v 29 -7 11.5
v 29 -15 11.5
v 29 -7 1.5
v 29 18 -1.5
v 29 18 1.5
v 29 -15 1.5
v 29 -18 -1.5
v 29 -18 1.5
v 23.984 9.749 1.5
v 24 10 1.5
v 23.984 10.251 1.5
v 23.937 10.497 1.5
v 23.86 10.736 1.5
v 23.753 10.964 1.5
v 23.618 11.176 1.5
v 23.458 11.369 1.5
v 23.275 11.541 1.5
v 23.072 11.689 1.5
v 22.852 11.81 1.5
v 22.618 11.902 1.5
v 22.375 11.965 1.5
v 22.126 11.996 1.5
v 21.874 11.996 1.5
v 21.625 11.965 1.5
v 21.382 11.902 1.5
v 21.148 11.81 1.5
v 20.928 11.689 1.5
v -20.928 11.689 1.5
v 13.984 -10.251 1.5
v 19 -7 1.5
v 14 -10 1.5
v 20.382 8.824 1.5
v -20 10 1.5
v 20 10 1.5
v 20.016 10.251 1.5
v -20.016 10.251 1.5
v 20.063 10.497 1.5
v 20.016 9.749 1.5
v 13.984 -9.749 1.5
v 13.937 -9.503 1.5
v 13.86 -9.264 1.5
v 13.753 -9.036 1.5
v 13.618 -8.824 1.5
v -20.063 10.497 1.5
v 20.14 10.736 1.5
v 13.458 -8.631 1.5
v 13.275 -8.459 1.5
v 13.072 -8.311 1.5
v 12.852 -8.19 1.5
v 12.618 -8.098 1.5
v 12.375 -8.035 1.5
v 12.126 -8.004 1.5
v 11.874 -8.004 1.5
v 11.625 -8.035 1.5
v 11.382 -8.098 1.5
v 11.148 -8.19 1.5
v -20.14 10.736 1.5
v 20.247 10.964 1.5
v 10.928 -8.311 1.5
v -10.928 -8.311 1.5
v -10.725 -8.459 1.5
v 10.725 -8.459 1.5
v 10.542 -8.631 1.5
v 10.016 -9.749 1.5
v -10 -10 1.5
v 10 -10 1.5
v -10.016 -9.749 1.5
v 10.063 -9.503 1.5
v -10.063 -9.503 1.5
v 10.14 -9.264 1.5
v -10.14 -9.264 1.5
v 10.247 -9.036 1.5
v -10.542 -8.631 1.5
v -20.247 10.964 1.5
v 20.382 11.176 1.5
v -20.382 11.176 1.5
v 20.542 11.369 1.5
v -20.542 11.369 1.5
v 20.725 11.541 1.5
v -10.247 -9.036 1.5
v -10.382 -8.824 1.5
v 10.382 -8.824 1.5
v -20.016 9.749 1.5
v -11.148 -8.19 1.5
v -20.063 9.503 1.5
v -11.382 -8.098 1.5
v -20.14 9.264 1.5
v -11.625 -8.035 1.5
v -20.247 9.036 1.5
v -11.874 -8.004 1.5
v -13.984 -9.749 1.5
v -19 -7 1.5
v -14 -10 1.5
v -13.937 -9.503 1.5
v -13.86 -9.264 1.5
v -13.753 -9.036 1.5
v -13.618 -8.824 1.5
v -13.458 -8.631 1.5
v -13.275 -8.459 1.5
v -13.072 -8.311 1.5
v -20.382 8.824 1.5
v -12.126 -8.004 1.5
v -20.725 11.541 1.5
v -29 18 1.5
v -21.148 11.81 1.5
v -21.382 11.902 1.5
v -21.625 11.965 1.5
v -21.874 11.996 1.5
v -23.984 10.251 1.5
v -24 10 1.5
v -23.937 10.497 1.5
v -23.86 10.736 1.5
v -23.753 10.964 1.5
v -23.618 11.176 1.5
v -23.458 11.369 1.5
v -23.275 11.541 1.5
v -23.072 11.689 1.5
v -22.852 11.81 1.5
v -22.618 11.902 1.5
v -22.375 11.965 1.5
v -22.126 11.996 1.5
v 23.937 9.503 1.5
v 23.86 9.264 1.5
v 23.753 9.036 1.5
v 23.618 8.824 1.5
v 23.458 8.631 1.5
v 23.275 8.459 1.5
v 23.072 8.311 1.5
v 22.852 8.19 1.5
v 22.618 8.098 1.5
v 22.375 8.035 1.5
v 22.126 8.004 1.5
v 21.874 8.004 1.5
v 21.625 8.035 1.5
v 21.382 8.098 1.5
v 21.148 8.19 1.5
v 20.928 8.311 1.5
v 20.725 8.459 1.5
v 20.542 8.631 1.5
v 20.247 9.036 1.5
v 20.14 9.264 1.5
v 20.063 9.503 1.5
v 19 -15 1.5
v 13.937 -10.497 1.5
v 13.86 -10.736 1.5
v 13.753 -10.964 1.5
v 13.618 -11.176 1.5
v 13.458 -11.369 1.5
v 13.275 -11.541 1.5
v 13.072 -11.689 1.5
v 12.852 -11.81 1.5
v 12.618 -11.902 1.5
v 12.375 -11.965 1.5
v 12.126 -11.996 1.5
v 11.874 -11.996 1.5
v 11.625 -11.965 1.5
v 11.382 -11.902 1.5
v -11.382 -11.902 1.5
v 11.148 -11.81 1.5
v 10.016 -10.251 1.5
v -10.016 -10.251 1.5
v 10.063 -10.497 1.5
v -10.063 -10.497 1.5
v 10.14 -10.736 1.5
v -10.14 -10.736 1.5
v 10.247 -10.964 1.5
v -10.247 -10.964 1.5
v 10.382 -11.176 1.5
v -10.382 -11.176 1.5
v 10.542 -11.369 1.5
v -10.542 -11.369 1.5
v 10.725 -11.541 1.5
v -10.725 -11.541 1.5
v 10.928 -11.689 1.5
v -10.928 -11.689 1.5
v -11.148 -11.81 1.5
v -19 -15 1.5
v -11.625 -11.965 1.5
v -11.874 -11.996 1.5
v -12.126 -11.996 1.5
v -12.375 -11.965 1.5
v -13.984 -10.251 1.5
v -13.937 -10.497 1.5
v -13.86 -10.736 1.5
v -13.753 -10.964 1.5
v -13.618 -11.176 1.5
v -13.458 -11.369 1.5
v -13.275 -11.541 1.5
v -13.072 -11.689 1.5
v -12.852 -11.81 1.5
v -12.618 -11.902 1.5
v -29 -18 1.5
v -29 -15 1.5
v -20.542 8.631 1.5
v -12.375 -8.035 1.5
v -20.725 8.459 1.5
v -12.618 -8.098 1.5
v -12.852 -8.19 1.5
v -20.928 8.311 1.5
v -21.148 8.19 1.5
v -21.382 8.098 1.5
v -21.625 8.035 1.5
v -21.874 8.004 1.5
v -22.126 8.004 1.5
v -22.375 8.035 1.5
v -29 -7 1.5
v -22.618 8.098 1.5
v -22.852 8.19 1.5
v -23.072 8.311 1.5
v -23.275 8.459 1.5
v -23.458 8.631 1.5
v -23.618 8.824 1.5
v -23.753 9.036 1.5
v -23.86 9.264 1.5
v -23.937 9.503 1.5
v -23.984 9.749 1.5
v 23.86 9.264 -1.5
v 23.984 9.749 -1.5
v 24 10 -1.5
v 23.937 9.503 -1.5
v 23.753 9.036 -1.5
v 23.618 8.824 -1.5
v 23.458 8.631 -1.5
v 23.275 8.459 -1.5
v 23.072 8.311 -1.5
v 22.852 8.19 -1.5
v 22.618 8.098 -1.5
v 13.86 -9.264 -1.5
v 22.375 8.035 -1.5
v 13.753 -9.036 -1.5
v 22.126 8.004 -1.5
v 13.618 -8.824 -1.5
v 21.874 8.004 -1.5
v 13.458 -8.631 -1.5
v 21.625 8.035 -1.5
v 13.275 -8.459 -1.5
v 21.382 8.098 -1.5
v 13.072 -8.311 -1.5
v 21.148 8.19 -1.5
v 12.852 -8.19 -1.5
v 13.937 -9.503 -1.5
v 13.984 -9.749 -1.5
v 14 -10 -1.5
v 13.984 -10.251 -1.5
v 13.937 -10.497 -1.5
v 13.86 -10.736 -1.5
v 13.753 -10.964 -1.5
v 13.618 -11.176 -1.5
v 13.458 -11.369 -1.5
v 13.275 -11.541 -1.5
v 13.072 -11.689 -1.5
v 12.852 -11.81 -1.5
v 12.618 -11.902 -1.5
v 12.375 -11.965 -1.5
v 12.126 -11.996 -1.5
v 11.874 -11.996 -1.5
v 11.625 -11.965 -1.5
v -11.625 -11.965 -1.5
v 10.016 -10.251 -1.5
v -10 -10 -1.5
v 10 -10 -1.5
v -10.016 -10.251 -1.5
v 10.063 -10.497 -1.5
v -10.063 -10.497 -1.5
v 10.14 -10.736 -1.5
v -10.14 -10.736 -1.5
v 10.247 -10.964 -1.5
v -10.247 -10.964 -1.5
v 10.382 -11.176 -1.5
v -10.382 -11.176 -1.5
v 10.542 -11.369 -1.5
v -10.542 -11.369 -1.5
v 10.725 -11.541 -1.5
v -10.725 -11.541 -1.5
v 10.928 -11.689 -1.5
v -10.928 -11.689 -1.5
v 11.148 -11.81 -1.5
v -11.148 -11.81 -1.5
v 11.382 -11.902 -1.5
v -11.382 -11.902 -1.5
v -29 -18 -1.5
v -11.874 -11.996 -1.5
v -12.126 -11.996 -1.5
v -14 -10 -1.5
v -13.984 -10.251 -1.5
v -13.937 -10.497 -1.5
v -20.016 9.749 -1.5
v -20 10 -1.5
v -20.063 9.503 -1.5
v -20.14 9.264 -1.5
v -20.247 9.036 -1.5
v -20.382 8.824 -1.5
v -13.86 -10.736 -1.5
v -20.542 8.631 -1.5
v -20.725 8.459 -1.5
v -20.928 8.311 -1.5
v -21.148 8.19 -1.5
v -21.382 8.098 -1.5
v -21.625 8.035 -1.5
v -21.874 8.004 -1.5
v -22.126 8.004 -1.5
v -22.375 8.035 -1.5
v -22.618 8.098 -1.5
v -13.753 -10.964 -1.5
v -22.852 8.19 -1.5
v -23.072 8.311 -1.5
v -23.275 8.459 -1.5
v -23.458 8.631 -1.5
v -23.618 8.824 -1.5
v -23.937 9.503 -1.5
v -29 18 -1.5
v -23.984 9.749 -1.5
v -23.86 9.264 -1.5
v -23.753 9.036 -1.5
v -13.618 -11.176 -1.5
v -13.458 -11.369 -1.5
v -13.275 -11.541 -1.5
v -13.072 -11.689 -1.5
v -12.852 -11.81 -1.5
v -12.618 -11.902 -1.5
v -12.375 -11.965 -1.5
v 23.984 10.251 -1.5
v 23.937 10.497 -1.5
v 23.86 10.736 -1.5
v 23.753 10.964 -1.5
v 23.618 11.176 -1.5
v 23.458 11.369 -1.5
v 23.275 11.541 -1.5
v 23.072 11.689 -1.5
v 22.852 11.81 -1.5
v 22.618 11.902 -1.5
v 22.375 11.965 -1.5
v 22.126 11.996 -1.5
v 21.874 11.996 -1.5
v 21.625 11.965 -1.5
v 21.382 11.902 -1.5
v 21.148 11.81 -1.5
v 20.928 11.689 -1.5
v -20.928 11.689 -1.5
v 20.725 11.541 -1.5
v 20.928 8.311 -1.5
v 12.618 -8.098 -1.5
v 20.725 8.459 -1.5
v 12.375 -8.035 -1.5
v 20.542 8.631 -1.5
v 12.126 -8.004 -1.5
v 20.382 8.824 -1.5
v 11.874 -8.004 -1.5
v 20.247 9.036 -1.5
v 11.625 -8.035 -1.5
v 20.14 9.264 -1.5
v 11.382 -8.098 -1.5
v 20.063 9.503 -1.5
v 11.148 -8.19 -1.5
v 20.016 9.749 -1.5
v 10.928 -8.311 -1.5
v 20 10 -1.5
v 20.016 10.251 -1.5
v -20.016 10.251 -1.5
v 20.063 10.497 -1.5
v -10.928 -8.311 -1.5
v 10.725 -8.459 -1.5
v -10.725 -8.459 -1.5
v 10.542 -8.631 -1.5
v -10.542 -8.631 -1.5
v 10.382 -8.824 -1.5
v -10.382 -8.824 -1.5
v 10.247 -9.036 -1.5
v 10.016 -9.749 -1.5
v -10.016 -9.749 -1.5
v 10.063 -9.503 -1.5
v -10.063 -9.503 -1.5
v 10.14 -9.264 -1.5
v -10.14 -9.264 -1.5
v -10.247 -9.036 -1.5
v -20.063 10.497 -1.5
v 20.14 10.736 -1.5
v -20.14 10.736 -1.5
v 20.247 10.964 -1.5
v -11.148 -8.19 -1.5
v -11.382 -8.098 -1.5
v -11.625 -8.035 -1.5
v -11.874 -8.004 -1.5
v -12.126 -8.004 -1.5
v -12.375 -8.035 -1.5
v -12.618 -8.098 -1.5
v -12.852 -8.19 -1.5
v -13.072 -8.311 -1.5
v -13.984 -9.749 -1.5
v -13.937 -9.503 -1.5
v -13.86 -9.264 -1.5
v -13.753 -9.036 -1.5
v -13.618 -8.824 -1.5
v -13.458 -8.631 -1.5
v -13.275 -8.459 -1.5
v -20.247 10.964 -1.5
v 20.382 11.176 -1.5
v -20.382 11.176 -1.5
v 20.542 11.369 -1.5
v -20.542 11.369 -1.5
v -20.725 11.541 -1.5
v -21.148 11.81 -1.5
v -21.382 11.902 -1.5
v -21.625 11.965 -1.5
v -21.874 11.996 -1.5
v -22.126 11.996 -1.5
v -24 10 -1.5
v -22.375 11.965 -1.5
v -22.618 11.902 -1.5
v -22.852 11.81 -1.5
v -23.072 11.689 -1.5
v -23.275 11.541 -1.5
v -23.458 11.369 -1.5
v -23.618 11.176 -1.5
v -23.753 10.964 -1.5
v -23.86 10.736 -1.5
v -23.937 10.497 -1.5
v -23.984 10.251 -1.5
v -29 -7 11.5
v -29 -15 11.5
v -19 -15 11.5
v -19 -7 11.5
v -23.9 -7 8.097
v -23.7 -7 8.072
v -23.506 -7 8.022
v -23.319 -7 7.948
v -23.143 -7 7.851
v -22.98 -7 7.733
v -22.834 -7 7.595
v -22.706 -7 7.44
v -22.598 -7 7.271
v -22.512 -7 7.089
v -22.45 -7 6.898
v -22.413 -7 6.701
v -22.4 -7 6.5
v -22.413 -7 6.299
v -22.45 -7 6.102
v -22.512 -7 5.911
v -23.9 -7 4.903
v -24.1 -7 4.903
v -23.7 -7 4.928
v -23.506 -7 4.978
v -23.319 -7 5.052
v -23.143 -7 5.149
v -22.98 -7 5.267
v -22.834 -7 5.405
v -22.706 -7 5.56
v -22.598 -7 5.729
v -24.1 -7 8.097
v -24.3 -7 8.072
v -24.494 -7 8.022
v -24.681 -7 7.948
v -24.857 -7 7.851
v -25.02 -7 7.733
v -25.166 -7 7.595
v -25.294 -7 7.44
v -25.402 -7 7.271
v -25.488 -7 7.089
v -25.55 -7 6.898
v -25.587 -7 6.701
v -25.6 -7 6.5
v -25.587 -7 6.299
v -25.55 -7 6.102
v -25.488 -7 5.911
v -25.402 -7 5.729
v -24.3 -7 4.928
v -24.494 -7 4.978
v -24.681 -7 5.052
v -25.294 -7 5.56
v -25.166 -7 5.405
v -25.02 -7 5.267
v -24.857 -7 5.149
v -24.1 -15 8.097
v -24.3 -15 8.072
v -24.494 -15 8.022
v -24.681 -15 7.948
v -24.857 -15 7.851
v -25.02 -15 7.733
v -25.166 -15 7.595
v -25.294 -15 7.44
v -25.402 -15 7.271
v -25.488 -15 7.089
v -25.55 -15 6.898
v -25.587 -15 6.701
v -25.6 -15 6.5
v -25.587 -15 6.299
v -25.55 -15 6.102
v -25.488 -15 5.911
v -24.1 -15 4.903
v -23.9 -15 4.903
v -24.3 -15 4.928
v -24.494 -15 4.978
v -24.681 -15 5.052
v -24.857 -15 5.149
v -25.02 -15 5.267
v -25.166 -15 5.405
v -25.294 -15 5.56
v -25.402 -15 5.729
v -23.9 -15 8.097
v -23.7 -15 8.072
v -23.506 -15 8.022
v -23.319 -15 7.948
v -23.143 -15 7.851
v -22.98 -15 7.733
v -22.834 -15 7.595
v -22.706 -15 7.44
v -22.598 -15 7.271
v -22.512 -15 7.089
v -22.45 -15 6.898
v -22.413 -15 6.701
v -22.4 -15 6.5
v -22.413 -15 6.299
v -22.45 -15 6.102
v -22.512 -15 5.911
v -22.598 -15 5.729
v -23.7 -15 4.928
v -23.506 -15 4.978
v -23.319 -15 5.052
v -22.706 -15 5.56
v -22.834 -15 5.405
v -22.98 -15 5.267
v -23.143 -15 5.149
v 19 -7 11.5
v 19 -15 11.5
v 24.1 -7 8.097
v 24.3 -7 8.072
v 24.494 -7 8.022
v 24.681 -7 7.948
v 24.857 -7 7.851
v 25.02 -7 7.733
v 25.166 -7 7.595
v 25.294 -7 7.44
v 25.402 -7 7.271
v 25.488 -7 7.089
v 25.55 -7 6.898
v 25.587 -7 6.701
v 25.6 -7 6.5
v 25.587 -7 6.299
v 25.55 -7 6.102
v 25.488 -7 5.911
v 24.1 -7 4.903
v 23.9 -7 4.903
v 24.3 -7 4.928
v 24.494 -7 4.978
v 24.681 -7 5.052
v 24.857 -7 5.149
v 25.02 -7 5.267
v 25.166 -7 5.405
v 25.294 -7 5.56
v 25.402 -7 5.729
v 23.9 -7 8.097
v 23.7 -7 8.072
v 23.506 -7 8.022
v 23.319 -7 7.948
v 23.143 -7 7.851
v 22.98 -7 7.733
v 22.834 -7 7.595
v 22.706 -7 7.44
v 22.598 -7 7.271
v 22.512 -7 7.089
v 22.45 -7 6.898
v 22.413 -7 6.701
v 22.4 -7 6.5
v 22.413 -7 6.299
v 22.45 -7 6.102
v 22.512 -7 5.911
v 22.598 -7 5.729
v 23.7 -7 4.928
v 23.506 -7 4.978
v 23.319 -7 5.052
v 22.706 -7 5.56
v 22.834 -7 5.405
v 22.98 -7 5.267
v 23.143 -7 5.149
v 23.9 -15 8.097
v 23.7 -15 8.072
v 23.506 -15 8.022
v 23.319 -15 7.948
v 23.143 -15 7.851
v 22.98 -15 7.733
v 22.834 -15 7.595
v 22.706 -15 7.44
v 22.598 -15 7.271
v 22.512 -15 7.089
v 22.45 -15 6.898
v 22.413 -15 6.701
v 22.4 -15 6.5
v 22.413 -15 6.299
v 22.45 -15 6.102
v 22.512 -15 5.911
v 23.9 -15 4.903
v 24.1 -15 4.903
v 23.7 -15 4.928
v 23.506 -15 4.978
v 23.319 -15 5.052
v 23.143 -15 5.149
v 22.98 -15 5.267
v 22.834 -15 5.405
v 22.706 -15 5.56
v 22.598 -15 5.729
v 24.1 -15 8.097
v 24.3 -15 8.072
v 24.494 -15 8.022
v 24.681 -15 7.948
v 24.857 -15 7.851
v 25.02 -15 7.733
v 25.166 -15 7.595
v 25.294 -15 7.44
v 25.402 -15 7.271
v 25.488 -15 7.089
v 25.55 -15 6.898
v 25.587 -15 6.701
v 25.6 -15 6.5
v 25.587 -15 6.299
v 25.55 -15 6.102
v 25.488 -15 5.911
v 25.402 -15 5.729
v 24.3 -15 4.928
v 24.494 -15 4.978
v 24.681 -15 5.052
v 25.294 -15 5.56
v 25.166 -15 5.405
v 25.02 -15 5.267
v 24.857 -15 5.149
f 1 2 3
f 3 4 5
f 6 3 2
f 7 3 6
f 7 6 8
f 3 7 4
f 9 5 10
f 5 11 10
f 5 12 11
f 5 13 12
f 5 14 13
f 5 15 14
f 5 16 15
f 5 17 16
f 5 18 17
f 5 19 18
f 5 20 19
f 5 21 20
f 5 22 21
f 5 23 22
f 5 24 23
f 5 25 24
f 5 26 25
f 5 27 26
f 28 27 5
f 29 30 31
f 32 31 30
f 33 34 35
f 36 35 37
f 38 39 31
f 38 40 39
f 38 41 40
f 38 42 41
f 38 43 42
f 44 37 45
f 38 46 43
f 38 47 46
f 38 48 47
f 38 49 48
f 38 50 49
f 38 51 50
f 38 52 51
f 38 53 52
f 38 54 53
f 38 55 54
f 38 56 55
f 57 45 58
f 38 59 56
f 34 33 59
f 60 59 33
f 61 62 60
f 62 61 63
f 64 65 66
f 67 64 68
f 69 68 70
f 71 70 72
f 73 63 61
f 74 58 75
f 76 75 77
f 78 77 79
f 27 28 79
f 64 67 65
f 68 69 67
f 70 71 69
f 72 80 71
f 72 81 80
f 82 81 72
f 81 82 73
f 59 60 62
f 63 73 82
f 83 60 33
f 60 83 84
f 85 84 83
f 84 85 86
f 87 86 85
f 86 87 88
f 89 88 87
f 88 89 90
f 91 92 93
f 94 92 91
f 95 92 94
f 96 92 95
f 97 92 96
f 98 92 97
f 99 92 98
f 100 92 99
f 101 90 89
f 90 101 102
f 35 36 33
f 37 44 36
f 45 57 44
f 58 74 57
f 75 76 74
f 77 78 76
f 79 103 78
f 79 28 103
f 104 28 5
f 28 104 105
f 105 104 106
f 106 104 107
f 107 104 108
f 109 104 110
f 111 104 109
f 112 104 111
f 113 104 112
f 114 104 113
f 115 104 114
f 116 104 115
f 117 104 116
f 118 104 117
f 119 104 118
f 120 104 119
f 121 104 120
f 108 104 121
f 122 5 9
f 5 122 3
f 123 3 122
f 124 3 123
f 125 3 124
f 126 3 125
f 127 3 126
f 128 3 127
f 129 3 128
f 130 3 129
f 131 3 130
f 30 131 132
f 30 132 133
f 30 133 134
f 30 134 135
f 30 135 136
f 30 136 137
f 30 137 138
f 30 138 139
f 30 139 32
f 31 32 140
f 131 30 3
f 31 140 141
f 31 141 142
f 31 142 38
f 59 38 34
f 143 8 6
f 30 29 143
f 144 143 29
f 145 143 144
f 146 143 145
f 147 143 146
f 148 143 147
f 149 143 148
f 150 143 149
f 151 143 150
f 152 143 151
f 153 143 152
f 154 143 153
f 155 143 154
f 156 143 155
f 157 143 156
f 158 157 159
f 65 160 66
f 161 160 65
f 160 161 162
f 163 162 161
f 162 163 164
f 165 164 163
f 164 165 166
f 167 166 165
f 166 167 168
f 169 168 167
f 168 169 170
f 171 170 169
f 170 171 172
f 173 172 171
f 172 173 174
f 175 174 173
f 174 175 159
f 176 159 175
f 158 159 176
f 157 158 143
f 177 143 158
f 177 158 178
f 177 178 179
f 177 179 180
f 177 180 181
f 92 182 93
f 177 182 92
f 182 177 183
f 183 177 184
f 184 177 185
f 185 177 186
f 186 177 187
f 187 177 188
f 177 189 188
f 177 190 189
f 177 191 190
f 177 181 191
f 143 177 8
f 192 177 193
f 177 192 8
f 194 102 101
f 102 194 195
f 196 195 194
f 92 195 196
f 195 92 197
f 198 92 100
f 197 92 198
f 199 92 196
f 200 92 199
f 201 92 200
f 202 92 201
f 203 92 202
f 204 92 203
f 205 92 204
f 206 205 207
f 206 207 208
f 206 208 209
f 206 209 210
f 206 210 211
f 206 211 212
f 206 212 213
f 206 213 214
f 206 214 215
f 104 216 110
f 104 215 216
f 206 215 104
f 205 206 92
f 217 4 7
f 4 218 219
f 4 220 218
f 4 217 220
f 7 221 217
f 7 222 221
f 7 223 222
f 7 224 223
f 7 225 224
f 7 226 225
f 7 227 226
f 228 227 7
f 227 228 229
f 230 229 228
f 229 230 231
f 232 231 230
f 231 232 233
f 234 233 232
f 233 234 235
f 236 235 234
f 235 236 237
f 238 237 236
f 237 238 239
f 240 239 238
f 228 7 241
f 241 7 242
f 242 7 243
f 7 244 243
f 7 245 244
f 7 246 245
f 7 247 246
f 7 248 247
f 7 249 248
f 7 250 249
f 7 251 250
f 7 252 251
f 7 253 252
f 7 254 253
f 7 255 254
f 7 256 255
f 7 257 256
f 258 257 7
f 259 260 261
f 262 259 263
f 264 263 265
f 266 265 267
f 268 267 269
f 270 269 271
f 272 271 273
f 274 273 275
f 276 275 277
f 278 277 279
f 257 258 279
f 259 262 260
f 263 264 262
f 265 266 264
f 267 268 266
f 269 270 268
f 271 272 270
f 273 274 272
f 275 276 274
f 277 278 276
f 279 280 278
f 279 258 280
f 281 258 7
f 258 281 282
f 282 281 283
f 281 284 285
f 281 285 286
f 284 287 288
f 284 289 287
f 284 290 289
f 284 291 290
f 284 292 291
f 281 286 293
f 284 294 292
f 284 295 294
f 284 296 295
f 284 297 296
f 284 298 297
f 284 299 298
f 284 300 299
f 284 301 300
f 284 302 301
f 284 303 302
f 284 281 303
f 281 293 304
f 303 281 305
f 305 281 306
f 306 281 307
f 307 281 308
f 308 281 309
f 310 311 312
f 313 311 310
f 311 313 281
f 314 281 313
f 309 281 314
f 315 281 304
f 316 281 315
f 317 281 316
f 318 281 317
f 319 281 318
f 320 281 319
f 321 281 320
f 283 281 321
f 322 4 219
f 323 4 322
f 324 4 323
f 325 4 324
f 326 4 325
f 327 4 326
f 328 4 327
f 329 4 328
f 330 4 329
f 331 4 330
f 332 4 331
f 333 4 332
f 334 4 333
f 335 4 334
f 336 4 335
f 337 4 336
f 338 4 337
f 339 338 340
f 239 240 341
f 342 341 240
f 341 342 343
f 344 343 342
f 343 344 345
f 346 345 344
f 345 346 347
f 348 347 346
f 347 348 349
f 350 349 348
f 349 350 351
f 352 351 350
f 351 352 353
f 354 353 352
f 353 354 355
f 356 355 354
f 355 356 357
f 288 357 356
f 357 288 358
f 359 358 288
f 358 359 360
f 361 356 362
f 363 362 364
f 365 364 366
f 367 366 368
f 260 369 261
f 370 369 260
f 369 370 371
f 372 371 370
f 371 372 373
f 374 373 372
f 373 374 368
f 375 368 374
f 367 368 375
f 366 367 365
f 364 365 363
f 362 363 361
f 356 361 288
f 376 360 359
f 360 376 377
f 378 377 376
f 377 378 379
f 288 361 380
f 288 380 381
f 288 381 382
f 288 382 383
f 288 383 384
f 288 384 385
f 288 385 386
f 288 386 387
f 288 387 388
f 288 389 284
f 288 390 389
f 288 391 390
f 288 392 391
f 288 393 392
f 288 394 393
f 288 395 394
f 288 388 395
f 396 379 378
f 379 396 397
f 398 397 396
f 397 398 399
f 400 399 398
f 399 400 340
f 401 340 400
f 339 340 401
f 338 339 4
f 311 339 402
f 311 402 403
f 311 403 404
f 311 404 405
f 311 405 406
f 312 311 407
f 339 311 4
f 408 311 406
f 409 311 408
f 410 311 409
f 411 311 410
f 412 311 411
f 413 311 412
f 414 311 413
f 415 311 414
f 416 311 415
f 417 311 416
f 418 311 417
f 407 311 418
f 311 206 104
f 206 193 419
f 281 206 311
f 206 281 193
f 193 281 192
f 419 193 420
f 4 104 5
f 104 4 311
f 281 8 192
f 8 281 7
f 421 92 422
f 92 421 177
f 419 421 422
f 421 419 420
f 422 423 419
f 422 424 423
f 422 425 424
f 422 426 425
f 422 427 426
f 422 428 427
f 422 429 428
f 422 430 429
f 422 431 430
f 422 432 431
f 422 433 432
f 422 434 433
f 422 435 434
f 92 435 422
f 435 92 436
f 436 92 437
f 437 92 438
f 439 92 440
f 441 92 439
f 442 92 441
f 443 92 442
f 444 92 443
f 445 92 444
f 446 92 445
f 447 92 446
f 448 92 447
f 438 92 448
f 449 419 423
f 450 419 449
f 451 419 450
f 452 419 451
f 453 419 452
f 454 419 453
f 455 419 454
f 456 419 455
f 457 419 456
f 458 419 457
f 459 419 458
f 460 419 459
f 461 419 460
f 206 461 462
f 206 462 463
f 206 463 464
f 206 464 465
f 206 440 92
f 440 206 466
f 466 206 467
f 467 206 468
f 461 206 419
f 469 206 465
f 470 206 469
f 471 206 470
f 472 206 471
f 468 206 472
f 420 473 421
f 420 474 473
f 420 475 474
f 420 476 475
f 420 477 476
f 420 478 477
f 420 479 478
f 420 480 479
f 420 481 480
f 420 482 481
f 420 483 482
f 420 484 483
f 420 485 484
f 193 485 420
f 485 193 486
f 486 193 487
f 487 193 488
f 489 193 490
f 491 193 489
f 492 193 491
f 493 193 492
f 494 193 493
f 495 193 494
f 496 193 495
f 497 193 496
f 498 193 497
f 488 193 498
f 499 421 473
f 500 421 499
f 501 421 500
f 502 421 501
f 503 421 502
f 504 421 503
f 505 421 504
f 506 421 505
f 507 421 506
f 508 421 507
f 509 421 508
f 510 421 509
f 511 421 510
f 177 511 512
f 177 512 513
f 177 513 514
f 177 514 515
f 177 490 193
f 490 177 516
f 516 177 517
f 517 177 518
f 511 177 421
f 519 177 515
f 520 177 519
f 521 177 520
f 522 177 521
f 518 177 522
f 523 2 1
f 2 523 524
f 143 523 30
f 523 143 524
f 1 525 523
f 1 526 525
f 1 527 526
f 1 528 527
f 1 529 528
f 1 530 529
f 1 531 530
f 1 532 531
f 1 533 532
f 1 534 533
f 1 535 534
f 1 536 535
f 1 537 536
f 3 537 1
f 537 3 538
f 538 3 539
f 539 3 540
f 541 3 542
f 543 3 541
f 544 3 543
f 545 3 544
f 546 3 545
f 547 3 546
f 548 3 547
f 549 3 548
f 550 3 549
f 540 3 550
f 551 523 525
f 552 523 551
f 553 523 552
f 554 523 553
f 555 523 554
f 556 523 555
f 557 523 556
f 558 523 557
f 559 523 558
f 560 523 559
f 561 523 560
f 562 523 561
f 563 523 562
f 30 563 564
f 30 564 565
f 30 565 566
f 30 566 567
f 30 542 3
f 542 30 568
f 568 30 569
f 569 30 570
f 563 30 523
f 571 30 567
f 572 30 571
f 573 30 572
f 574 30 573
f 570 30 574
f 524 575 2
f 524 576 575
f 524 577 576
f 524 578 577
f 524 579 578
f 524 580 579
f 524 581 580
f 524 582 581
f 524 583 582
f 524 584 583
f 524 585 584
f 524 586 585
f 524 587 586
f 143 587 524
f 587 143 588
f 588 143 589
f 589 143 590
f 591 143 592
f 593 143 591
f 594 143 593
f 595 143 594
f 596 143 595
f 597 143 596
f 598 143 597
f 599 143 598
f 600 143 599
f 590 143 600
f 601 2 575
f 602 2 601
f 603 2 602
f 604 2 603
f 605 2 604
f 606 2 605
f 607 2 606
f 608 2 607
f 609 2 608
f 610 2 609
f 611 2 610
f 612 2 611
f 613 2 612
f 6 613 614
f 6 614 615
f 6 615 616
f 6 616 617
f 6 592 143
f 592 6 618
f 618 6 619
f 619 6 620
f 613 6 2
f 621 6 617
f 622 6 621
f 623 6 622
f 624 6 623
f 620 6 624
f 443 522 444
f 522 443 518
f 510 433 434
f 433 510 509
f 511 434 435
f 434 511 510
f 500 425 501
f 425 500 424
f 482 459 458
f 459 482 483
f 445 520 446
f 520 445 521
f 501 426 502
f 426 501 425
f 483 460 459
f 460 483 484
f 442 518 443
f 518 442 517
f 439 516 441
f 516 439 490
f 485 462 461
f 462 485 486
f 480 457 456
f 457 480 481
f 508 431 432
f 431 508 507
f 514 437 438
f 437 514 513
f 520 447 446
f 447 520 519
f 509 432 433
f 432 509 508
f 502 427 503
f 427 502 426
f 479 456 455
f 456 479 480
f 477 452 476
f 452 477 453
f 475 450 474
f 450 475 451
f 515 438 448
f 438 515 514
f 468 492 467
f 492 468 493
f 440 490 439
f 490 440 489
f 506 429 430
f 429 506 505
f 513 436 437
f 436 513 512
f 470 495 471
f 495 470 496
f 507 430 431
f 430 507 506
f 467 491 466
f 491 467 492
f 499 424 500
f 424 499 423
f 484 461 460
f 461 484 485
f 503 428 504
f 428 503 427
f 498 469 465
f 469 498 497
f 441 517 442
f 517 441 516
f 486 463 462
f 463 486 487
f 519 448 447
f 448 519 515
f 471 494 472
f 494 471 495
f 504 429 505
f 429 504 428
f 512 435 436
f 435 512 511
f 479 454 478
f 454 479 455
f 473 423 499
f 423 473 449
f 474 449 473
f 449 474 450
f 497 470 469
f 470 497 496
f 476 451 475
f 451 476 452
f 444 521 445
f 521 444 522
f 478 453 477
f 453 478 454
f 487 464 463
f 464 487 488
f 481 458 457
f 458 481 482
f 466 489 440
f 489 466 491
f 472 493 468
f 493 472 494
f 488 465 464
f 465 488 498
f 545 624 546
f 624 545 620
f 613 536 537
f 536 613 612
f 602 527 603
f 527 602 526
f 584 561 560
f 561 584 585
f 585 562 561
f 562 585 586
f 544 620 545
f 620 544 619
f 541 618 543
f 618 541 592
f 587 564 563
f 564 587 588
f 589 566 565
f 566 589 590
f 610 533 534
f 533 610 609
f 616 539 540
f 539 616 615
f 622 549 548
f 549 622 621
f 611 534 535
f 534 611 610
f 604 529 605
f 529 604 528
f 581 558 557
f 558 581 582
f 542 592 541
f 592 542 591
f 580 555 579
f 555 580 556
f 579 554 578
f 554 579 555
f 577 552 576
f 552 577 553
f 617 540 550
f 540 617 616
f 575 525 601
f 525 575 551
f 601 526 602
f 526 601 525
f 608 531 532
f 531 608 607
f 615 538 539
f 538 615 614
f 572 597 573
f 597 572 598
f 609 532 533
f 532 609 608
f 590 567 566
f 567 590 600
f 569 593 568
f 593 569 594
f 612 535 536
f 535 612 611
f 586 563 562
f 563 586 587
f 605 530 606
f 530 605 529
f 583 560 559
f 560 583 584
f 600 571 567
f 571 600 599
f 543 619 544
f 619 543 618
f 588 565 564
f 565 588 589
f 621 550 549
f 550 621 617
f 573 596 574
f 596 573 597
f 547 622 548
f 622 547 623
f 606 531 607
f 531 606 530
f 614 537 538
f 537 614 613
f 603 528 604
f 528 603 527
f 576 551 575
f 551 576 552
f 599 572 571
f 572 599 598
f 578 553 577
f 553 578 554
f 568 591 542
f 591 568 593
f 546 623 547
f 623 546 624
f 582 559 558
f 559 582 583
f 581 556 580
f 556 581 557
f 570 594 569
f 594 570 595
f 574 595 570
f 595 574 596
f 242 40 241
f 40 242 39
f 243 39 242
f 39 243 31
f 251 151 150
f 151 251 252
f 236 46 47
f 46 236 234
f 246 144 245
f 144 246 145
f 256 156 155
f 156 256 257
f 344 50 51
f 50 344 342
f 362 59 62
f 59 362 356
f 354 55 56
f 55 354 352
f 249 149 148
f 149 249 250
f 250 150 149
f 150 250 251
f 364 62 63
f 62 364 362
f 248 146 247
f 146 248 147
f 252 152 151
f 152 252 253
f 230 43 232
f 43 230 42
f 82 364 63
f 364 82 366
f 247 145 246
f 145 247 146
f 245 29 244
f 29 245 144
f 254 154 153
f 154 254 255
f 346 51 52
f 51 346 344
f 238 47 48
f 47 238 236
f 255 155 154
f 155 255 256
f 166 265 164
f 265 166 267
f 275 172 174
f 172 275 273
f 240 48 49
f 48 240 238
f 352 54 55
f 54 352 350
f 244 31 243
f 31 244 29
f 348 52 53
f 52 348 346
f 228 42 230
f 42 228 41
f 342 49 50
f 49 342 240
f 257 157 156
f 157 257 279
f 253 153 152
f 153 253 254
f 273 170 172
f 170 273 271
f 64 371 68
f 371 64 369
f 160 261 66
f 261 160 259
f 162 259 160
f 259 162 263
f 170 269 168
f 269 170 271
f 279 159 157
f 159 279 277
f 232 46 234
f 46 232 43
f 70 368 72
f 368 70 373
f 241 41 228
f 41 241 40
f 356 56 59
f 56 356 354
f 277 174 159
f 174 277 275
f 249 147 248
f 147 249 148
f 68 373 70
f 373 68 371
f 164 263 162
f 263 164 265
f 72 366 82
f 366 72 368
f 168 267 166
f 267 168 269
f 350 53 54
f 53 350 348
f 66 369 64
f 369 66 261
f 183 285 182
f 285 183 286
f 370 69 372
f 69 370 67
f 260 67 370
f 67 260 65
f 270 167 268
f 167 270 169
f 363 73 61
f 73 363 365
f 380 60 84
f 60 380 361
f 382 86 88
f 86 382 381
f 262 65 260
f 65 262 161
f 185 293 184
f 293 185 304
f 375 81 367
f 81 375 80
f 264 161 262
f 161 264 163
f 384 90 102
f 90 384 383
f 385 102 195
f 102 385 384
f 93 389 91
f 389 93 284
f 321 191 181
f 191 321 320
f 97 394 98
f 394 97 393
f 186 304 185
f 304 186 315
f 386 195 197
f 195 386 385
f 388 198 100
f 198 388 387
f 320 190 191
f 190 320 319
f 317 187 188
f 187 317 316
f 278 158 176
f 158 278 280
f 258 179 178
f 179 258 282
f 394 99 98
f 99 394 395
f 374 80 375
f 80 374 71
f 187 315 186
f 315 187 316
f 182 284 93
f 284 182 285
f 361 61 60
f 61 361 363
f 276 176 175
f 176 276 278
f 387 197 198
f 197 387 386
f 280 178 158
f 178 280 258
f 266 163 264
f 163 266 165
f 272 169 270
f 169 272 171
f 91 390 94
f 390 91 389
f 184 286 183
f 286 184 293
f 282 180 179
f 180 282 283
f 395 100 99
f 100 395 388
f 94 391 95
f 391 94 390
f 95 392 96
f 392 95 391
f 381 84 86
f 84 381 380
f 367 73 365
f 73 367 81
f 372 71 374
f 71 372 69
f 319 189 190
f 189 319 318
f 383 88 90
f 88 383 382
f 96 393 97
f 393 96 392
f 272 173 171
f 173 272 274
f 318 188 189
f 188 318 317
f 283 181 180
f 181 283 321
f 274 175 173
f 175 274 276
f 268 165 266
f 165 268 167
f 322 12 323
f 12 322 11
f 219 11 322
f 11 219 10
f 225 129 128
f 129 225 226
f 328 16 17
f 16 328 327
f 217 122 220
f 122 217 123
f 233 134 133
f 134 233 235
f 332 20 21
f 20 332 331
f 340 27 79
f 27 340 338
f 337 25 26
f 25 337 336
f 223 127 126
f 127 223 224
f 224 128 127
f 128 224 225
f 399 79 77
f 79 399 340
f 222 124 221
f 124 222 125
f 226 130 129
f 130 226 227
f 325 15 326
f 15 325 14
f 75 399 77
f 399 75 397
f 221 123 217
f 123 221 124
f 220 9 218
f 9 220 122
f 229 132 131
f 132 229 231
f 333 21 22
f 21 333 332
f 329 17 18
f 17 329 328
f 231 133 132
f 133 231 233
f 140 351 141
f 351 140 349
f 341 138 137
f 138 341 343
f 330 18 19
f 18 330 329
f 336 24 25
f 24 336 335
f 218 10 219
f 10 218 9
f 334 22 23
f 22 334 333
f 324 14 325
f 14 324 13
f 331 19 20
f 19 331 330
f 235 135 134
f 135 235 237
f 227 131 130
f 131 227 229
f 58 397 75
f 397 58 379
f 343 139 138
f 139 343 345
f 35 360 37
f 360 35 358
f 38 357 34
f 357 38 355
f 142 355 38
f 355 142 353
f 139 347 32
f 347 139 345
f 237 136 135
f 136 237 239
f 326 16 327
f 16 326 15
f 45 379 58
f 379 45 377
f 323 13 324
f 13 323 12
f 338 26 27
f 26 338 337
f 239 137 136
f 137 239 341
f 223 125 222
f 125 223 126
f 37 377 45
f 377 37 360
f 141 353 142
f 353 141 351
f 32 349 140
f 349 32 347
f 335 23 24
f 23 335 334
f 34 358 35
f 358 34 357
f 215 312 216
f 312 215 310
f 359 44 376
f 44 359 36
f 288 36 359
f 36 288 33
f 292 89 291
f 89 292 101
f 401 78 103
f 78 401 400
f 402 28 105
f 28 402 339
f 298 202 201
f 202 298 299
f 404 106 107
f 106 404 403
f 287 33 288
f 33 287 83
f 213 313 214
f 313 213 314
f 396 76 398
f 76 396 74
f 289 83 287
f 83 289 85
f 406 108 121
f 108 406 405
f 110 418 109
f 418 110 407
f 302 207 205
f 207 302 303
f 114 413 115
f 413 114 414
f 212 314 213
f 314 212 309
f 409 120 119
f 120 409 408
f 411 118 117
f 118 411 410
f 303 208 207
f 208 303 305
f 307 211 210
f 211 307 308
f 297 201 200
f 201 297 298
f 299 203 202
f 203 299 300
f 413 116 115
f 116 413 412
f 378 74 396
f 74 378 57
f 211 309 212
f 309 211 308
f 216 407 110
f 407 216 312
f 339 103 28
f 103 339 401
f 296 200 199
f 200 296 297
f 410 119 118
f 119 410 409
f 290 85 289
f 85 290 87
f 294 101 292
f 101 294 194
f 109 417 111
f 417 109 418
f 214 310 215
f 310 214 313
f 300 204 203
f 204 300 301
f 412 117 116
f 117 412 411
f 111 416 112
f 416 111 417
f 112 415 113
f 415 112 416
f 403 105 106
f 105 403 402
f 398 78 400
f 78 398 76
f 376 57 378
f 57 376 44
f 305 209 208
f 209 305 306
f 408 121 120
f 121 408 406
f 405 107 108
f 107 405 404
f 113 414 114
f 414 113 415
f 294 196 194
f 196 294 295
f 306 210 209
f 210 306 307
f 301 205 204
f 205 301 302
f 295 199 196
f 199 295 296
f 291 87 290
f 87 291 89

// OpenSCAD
// meter plate
//  the mounting plate for the meter bezel
//  sits horizontally at top of case

// thread the mounting block
// pass-through the plate (vertically

rail_width = 20;

plate_x = 46 + 12;
plate_y = 8 + rail_width + 8;
plate_z = 3;

mounting_block_x = 10;
mounting_block_y = 8;
mounting_block_z = 10;

bezel_thickness = plate_z;

m4_pilot = 3.2;
m4_dia = 4;

vert_m4_x_offset = (plate_x - (2*10) - 4 - 10)/2;

$fn = 50;

difference () {
    {
    union () {
        cube([plate_x, plate_y, plate_z], center = true);
        
        // mounting block
        translate([-plate_x/2 + mounting_block_x/2,
            -plate_y/2 + bezel_thickness + mounting_block_y/2,
            plate_z/2 +  mounting_block_z/2])
        cube([mounting_block_x, mounting_block_y, mounting_block_z], center = true);
        
        // mounting block
        translate([plate_x/2 - mounting_block_x/2,
            -plate_y/2 + bezel_thickness + mounting_block_y/2,
            plate_z/2 +  mounting_block_z/2])
        cube([mounting_block_x, mounting_block_y, mounting_block_z], center = true);
        }
    }
    // subtract
    {
        // threaded mounting holes
        translate([-(plate_x/2 - mounting_block_x/2),
            -(plate_y/2 - bezel_thickness - mounting_block_y/2) ,
            plate_z/2 + mounting_block_z/2])
        rotate([90,0,0])
        cylinder(r = m4_pilot/2, h = mounting_block_y, center = true);
        
        translate([(plate_x/2 - mounting_block_x/2),
            -(plate_y/2 - bezel_thickness - mounting_block_y/2) ,
            plate_z/2 + mounting_block_z/2])
        rotate([90,0,0])
        cylinder(r = m4_pilot/2, h = mounting_block_y, center = true);
        // pass thru mounting holes
        
        // pass-thru holes 
        translate([vert_m4_x_offset,
            -(plate_y/2 -bezel_thickness - 10/2),
            0])
        cylinder(r = m4_dia/2, h = plate_z, center = true);
        
        translate([-vert_m4_x_offset,
            -(plate_y/2 -bezel_thickness - 10/2),
            0])
        cylinder(r = m4_dia/2, h = plate_z, center = true);
        
        // rail holes - pass - thru
        translate([vert_m4_x_offset + 10,
            -(plate_y/2 -bezel_thickness - 10/2 - rail_width),
            0])
        #cylinder(r = m4_dia/2, h = plate_z, center = true);
        
        translate([-(vert_m4_x_offset + 10),
            -(plate_y/2 -bezel_thickness - 10/2 - rail_width),
            0])
        cylinder(r = m4_dia/2, h = plate_z, center = true);
        
    }
}
